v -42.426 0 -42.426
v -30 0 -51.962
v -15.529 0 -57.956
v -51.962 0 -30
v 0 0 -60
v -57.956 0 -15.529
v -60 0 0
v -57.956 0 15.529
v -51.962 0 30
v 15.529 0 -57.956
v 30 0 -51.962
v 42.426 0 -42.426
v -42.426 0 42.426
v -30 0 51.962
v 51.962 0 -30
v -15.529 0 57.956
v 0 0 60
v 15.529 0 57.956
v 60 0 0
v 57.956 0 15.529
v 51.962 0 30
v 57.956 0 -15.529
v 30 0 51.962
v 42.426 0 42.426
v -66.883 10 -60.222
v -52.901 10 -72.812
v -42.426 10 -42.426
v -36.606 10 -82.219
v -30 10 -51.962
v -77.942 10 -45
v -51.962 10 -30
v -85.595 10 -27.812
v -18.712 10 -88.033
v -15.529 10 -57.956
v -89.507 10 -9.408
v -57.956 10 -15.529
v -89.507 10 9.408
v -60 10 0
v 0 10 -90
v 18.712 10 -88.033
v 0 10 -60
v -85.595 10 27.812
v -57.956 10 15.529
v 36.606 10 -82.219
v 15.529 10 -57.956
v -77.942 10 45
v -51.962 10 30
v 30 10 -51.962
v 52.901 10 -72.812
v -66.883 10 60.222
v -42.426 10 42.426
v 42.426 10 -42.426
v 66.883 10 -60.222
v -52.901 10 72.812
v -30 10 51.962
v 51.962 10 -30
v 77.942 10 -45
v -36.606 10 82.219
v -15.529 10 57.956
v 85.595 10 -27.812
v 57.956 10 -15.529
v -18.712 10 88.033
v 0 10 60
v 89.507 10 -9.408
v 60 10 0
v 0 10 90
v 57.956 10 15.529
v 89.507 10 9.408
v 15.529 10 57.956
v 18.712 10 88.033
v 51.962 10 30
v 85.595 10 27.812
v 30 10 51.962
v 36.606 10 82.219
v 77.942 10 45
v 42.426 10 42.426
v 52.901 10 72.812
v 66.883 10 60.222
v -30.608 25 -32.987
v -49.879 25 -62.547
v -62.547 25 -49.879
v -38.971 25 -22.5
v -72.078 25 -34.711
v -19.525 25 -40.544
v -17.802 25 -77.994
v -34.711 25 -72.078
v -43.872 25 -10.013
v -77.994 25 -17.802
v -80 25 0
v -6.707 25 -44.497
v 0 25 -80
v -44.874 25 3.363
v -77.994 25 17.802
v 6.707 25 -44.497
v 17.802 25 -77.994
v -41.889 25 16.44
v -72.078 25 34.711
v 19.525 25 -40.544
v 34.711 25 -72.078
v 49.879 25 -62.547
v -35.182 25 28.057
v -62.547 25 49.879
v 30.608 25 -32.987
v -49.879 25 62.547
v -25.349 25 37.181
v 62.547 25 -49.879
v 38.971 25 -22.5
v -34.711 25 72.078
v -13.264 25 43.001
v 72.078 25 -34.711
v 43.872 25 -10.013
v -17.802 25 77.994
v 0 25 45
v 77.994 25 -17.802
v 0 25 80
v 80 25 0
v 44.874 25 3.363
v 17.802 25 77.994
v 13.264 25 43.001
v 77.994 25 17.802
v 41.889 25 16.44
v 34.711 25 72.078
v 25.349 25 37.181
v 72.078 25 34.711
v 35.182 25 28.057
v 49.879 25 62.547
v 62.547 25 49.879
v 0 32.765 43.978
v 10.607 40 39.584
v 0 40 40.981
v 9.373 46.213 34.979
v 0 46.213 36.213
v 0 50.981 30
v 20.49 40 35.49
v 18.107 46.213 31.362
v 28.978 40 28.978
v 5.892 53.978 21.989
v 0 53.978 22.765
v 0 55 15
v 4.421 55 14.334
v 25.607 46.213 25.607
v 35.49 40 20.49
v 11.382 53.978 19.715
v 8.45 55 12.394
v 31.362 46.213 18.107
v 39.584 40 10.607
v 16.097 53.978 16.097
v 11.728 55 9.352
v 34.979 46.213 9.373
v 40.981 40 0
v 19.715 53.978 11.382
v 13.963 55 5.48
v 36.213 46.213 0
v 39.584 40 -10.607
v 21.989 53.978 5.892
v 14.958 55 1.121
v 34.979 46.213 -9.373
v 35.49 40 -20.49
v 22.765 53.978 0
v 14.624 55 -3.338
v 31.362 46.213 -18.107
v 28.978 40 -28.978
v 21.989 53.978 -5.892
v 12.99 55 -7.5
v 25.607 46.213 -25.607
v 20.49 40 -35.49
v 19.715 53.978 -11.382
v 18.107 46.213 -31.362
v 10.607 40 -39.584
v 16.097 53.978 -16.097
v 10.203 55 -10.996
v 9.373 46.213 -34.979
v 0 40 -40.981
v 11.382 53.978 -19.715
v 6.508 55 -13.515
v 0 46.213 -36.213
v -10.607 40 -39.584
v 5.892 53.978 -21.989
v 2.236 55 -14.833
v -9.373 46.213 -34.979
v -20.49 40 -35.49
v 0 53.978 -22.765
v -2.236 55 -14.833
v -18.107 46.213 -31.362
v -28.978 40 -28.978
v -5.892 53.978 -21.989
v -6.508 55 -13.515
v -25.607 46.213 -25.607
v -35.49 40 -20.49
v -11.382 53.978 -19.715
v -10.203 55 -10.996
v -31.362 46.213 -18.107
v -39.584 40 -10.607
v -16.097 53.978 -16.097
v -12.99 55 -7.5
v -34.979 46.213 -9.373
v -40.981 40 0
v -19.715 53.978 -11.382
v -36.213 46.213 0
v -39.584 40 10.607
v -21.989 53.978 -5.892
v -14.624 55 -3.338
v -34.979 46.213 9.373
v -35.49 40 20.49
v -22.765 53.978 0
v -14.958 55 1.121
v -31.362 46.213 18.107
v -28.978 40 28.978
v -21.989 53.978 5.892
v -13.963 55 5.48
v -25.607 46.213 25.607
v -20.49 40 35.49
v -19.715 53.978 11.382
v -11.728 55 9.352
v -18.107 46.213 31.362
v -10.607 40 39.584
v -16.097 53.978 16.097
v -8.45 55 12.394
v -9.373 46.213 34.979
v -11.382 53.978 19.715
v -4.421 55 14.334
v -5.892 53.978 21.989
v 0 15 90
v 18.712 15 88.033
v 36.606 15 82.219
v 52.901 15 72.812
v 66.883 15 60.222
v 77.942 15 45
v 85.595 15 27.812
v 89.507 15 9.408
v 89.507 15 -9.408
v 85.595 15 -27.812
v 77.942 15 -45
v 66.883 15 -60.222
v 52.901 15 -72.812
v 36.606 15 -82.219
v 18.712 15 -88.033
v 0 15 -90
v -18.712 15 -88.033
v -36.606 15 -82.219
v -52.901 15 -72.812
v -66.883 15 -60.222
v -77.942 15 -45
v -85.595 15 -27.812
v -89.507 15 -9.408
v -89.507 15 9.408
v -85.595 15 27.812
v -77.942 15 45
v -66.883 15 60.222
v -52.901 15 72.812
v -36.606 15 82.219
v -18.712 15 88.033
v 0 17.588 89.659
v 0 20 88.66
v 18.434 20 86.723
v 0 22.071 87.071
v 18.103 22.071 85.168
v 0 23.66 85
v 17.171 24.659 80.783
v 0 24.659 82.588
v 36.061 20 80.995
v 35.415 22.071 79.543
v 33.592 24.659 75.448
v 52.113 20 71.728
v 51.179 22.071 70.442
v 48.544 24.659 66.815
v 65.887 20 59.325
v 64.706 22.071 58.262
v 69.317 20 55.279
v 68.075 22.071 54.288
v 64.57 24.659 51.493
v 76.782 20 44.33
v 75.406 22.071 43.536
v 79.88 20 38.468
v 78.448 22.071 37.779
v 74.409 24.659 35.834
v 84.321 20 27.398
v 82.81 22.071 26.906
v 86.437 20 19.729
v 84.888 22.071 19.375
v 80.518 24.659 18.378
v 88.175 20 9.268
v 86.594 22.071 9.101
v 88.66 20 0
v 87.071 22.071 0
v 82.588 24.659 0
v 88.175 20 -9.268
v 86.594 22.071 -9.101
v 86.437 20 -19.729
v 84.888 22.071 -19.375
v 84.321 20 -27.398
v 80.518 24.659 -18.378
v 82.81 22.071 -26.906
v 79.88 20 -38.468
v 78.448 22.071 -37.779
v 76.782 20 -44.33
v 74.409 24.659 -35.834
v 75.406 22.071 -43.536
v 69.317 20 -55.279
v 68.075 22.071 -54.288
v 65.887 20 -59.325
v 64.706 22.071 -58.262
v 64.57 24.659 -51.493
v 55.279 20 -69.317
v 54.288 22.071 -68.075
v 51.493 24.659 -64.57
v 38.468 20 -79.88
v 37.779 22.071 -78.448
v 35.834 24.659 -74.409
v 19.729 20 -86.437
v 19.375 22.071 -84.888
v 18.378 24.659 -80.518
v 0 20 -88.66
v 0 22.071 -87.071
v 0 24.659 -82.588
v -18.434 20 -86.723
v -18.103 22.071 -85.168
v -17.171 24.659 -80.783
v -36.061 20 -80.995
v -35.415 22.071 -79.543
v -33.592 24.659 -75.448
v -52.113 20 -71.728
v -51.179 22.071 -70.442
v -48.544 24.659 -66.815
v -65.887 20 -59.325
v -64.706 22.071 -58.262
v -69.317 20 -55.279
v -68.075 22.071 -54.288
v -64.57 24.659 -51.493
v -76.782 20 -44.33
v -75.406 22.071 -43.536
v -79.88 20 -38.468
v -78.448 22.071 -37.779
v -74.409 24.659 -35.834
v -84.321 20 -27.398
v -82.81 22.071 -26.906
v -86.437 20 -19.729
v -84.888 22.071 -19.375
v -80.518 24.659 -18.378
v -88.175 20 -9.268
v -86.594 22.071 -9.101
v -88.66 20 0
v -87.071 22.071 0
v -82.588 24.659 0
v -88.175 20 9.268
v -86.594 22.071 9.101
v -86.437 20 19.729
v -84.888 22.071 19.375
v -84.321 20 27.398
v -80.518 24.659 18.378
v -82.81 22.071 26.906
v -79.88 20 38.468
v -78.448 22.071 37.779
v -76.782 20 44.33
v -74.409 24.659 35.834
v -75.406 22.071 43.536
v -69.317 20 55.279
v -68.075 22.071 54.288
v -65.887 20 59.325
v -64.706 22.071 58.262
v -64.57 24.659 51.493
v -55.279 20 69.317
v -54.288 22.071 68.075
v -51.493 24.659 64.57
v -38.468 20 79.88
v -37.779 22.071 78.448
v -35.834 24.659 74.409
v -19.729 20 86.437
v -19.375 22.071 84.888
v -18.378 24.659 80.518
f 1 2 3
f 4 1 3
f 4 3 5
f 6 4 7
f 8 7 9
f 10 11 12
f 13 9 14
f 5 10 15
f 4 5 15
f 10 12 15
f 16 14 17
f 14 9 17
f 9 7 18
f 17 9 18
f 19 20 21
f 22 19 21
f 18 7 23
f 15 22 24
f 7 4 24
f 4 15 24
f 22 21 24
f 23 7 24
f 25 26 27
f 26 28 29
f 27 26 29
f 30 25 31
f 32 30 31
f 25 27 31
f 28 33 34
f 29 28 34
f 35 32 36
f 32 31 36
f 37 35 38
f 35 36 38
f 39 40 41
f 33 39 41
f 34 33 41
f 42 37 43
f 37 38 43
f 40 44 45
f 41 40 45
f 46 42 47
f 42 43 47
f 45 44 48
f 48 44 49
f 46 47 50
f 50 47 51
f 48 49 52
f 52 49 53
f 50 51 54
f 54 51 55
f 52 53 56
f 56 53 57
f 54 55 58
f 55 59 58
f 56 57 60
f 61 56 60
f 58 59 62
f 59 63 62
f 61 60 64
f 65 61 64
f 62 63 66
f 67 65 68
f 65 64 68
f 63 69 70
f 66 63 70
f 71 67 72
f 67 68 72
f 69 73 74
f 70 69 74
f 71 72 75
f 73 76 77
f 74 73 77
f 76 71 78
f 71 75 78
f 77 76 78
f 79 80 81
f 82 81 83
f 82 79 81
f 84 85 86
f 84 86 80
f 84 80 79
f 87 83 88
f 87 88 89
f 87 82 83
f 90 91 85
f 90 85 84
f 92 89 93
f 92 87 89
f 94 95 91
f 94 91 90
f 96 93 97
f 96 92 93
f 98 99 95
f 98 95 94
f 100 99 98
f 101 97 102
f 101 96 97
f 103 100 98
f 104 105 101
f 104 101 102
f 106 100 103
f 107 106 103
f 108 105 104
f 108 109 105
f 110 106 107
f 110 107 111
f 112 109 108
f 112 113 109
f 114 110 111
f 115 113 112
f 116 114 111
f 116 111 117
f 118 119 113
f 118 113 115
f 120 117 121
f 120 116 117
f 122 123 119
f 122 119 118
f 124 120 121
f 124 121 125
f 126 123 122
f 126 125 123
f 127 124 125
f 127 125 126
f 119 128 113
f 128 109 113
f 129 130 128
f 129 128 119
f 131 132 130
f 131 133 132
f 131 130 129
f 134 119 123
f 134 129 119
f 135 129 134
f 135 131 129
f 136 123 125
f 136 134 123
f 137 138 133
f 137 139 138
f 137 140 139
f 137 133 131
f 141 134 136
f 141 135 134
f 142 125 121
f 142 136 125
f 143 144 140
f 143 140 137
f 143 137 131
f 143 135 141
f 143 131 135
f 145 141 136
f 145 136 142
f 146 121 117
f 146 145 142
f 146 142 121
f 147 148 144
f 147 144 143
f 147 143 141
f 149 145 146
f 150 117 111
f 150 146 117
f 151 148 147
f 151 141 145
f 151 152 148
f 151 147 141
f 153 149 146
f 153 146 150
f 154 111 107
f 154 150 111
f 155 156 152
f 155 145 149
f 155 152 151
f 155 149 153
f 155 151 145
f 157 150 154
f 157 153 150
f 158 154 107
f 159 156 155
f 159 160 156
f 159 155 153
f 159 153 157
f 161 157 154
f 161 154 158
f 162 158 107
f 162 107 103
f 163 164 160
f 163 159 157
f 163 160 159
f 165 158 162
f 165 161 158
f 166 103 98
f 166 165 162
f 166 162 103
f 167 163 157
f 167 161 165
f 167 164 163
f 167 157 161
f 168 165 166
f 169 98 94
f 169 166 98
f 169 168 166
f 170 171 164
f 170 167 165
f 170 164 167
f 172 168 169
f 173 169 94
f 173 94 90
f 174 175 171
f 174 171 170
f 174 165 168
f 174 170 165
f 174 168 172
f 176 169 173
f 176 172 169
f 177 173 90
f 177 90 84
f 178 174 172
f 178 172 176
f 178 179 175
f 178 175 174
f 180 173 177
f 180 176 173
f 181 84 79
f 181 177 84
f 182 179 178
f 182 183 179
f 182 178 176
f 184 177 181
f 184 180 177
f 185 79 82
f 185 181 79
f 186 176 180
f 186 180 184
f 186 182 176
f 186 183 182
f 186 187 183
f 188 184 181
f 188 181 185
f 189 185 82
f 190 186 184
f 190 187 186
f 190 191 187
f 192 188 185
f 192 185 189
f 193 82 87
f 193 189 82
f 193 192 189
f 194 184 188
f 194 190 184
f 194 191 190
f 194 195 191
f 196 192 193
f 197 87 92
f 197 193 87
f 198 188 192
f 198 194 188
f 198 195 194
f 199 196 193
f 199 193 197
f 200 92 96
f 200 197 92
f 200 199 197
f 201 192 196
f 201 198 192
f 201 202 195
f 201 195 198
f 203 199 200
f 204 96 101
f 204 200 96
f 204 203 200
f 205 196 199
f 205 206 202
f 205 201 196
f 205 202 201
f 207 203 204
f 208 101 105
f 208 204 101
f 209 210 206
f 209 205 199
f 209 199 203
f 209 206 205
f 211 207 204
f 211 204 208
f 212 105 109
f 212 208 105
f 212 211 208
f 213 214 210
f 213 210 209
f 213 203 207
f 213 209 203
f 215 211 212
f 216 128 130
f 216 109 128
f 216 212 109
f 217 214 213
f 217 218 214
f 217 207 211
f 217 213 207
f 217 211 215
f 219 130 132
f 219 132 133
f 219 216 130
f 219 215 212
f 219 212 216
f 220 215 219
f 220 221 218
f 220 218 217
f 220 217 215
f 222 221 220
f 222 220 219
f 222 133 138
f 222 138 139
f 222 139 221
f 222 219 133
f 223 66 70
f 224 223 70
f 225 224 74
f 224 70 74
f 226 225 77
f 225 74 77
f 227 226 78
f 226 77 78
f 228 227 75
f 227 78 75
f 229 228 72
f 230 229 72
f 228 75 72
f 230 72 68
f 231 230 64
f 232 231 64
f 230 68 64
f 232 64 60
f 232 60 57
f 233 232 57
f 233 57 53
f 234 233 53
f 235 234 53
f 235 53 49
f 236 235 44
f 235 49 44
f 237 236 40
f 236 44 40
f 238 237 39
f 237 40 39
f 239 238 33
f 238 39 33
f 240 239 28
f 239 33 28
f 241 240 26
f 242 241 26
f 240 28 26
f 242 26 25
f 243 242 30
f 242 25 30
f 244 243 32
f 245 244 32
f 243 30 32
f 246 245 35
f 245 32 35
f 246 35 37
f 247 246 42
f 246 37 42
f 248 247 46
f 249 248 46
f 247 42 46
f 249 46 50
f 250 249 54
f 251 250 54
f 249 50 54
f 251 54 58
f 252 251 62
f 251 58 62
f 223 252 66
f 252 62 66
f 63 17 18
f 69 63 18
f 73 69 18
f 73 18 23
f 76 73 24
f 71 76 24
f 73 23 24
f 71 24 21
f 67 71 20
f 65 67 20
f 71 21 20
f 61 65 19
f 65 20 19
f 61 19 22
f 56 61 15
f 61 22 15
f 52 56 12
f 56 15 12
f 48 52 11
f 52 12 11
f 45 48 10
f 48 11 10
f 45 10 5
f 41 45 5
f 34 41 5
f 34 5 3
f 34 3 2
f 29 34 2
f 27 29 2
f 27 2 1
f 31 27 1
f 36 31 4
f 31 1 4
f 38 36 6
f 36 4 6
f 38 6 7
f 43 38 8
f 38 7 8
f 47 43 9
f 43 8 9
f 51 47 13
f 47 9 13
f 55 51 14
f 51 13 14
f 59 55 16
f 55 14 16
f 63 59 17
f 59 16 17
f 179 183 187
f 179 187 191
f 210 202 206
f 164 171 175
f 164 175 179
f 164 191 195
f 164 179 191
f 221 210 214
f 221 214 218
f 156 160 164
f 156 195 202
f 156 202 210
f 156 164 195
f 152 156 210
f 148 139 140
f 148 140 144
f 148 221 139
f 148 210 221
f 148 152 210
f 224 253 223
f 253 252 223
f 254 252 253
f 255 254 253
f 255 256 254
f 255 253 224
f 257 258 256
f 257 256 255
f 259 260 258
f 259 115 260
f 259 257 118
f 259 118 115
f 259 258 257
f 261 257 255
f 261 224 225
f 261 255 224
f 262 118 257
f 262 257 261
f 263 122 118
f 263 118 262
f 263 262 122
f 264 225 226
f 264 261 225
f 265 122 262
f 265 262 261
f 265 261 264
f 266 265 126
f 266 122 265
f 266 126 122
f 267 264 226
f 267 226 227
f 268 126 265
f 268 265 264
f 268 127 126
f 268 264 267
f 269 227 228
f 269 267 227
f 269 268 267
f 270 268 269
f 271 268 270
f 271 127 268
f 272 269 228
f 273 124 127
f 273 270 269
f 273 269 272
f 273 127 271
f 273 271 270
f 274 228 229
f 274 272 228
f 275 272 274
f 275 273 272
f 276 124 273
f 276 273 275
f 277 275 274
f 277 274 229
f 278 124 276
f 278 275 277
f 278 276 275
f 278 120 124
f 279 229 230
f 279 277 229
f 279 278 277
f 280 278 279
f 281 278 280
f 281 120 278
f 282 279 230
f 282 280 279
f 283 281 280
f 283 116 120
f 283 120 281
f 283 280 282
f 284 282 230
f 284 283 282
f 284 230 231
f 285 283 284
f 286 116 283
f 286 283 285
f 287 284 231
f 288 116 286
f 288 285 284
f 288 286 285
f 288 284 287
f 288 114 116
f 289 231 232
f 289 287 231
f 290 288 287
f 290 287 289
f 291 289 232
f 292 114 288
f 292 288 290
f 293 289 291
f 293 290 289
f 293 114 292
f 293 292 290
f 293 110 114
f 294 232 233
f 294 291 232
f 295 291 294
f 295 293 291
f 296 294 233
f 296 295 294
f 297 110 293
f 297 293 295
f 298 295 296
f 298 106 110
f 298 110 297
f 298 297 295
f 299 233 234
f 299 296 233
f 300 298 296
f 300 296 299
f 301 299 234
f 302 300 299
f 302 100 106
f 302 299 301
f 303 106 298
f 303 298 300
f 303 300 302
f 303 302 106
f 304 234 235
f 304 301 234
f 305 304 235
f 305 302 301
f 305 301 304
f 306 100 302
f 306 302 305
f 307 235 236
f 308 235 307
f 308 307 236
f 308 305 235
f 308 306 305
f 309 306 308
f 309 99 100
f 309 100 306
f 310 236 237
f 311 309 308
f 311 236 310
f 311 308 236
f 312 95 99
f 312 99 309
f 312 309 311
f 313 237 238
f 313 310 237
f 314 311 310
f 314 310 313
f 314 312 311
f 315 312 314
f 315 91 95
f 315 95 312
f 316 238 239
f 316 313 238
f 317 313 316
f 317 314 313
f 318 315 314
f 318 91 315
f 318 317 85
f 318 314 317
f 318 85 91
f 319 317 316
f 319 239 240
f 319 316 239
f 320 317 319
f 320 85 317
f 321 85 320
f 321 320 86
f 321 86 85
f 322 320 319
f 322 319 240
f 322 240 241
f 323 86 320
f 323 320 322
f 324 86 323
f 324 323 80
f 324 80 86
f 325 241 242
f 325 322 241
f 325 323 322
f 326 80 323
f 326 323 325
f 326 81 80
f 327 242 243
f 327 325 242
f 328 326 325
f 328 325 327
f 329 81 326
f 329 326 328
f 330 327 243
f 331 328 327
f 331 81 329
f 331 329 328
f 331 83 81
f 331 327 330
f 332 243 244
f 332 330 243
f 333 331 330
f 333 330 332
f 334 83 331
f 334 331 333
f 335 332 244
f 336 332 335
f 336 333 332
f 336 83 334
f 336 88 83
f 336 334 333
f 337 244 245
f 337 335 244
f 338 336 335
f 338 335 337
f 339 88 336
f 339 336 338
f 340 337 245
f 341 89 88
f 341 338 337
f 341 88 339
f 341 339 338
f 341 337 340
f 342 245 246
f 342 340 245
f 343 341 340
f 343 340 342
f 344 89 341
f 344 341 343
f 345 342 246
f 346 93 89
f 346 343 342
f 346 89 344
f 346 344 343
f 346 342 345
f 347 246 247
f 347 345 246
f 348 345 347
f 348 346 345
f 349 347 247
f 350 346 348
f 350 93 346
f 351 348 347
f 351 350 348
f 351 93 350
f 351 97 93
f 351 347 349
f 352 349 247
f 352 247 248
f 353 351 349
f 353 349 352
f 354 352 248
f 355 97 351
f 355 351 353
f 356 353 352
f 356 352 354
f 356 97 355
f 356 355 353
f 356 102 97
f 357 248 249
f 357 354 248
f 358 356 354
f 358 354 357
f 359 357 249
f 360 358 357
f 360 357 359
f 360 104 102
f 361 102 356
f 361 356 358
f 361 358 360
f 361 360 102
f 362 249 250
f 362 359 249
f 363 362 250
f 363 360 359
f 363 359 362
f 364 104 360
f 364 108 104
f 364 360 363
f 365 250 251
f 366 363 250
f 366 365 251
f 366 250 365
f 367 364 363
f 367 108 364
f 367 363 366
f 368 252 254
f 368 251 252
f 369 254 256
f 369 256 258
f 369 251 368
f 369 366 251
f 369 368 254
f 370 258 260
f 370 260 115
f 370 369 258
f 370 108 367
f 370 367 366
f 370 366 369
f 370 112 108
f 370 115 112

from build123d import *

# Parameters (mm, degrees)
SKETCH1_R           = 60
BOSS_EXTRUDE1_DEPTH = 10
SKETCH2_R           = 90
BOSS_EXTRUDE2_DEPTH = 15
SKETCH3_R           = 45
BOSS_EXTRUDE3_DEPTH = 30
FILLET1_R           = 10
FILLET2_R           = 30


with BuildPart() as part:
    # Sketch1 → Boss-Extrude1 (new body)
    with BuildSketch(Plane(origin=(0, 0, 0), x_dir=(1, 0, 0), z_dir=(0, 1, 0))):
        with Locations(Location((0, 0, 0), (0, 0, 270))):
            Circle(SKETCH1_R)
    extrude(amount=BOSS_EXTRUDE1_DEPTH)

    # Sketch2 → Boss-Extrude2 (add)
    with BuildSketch(Plane(origin=(0, 10, 0), x_dir=(1, 0, 0), z_dir=(0, 1, 0))):
        with Locations(Location((0, 0, 0), (0, 0, 270))):
            Circle(SKETCH2_R)
    extrude(amount=BOSS_EXTRUDE2_DEPTH)

    # Sketch3 → Boss-Extrude3 (add)
    with BuildSketch(Plane(origin=(0, 25, 0), x_dir=(1, 0, 0), z_dir=(0, 1, 0))):
        with Locations(Location((0, 0, 0), (0, 0, 270))):
            Circle(SKETCH3_R)
    extrude(amount=BOSS_EXTRUDE3_DEPTH)

    # Fillet1
    fillet1_edges = [part.edges().sort_by_distance(p)[0] for p in [
        (0, 25, -90),
    ]]
    fillet(fillet1_edges, radius=FILLET1_R)

    # Fillet2
    fillet2_edges = [part.edges().sort_by_distance(p)[0] for p in [
        (0, 55, -45),
    ]]
    fillet(fillet2_edges, radius=FILLET2_R - 0.0001)  # a hair under: the kernel refuses the full size


solid = part.part
